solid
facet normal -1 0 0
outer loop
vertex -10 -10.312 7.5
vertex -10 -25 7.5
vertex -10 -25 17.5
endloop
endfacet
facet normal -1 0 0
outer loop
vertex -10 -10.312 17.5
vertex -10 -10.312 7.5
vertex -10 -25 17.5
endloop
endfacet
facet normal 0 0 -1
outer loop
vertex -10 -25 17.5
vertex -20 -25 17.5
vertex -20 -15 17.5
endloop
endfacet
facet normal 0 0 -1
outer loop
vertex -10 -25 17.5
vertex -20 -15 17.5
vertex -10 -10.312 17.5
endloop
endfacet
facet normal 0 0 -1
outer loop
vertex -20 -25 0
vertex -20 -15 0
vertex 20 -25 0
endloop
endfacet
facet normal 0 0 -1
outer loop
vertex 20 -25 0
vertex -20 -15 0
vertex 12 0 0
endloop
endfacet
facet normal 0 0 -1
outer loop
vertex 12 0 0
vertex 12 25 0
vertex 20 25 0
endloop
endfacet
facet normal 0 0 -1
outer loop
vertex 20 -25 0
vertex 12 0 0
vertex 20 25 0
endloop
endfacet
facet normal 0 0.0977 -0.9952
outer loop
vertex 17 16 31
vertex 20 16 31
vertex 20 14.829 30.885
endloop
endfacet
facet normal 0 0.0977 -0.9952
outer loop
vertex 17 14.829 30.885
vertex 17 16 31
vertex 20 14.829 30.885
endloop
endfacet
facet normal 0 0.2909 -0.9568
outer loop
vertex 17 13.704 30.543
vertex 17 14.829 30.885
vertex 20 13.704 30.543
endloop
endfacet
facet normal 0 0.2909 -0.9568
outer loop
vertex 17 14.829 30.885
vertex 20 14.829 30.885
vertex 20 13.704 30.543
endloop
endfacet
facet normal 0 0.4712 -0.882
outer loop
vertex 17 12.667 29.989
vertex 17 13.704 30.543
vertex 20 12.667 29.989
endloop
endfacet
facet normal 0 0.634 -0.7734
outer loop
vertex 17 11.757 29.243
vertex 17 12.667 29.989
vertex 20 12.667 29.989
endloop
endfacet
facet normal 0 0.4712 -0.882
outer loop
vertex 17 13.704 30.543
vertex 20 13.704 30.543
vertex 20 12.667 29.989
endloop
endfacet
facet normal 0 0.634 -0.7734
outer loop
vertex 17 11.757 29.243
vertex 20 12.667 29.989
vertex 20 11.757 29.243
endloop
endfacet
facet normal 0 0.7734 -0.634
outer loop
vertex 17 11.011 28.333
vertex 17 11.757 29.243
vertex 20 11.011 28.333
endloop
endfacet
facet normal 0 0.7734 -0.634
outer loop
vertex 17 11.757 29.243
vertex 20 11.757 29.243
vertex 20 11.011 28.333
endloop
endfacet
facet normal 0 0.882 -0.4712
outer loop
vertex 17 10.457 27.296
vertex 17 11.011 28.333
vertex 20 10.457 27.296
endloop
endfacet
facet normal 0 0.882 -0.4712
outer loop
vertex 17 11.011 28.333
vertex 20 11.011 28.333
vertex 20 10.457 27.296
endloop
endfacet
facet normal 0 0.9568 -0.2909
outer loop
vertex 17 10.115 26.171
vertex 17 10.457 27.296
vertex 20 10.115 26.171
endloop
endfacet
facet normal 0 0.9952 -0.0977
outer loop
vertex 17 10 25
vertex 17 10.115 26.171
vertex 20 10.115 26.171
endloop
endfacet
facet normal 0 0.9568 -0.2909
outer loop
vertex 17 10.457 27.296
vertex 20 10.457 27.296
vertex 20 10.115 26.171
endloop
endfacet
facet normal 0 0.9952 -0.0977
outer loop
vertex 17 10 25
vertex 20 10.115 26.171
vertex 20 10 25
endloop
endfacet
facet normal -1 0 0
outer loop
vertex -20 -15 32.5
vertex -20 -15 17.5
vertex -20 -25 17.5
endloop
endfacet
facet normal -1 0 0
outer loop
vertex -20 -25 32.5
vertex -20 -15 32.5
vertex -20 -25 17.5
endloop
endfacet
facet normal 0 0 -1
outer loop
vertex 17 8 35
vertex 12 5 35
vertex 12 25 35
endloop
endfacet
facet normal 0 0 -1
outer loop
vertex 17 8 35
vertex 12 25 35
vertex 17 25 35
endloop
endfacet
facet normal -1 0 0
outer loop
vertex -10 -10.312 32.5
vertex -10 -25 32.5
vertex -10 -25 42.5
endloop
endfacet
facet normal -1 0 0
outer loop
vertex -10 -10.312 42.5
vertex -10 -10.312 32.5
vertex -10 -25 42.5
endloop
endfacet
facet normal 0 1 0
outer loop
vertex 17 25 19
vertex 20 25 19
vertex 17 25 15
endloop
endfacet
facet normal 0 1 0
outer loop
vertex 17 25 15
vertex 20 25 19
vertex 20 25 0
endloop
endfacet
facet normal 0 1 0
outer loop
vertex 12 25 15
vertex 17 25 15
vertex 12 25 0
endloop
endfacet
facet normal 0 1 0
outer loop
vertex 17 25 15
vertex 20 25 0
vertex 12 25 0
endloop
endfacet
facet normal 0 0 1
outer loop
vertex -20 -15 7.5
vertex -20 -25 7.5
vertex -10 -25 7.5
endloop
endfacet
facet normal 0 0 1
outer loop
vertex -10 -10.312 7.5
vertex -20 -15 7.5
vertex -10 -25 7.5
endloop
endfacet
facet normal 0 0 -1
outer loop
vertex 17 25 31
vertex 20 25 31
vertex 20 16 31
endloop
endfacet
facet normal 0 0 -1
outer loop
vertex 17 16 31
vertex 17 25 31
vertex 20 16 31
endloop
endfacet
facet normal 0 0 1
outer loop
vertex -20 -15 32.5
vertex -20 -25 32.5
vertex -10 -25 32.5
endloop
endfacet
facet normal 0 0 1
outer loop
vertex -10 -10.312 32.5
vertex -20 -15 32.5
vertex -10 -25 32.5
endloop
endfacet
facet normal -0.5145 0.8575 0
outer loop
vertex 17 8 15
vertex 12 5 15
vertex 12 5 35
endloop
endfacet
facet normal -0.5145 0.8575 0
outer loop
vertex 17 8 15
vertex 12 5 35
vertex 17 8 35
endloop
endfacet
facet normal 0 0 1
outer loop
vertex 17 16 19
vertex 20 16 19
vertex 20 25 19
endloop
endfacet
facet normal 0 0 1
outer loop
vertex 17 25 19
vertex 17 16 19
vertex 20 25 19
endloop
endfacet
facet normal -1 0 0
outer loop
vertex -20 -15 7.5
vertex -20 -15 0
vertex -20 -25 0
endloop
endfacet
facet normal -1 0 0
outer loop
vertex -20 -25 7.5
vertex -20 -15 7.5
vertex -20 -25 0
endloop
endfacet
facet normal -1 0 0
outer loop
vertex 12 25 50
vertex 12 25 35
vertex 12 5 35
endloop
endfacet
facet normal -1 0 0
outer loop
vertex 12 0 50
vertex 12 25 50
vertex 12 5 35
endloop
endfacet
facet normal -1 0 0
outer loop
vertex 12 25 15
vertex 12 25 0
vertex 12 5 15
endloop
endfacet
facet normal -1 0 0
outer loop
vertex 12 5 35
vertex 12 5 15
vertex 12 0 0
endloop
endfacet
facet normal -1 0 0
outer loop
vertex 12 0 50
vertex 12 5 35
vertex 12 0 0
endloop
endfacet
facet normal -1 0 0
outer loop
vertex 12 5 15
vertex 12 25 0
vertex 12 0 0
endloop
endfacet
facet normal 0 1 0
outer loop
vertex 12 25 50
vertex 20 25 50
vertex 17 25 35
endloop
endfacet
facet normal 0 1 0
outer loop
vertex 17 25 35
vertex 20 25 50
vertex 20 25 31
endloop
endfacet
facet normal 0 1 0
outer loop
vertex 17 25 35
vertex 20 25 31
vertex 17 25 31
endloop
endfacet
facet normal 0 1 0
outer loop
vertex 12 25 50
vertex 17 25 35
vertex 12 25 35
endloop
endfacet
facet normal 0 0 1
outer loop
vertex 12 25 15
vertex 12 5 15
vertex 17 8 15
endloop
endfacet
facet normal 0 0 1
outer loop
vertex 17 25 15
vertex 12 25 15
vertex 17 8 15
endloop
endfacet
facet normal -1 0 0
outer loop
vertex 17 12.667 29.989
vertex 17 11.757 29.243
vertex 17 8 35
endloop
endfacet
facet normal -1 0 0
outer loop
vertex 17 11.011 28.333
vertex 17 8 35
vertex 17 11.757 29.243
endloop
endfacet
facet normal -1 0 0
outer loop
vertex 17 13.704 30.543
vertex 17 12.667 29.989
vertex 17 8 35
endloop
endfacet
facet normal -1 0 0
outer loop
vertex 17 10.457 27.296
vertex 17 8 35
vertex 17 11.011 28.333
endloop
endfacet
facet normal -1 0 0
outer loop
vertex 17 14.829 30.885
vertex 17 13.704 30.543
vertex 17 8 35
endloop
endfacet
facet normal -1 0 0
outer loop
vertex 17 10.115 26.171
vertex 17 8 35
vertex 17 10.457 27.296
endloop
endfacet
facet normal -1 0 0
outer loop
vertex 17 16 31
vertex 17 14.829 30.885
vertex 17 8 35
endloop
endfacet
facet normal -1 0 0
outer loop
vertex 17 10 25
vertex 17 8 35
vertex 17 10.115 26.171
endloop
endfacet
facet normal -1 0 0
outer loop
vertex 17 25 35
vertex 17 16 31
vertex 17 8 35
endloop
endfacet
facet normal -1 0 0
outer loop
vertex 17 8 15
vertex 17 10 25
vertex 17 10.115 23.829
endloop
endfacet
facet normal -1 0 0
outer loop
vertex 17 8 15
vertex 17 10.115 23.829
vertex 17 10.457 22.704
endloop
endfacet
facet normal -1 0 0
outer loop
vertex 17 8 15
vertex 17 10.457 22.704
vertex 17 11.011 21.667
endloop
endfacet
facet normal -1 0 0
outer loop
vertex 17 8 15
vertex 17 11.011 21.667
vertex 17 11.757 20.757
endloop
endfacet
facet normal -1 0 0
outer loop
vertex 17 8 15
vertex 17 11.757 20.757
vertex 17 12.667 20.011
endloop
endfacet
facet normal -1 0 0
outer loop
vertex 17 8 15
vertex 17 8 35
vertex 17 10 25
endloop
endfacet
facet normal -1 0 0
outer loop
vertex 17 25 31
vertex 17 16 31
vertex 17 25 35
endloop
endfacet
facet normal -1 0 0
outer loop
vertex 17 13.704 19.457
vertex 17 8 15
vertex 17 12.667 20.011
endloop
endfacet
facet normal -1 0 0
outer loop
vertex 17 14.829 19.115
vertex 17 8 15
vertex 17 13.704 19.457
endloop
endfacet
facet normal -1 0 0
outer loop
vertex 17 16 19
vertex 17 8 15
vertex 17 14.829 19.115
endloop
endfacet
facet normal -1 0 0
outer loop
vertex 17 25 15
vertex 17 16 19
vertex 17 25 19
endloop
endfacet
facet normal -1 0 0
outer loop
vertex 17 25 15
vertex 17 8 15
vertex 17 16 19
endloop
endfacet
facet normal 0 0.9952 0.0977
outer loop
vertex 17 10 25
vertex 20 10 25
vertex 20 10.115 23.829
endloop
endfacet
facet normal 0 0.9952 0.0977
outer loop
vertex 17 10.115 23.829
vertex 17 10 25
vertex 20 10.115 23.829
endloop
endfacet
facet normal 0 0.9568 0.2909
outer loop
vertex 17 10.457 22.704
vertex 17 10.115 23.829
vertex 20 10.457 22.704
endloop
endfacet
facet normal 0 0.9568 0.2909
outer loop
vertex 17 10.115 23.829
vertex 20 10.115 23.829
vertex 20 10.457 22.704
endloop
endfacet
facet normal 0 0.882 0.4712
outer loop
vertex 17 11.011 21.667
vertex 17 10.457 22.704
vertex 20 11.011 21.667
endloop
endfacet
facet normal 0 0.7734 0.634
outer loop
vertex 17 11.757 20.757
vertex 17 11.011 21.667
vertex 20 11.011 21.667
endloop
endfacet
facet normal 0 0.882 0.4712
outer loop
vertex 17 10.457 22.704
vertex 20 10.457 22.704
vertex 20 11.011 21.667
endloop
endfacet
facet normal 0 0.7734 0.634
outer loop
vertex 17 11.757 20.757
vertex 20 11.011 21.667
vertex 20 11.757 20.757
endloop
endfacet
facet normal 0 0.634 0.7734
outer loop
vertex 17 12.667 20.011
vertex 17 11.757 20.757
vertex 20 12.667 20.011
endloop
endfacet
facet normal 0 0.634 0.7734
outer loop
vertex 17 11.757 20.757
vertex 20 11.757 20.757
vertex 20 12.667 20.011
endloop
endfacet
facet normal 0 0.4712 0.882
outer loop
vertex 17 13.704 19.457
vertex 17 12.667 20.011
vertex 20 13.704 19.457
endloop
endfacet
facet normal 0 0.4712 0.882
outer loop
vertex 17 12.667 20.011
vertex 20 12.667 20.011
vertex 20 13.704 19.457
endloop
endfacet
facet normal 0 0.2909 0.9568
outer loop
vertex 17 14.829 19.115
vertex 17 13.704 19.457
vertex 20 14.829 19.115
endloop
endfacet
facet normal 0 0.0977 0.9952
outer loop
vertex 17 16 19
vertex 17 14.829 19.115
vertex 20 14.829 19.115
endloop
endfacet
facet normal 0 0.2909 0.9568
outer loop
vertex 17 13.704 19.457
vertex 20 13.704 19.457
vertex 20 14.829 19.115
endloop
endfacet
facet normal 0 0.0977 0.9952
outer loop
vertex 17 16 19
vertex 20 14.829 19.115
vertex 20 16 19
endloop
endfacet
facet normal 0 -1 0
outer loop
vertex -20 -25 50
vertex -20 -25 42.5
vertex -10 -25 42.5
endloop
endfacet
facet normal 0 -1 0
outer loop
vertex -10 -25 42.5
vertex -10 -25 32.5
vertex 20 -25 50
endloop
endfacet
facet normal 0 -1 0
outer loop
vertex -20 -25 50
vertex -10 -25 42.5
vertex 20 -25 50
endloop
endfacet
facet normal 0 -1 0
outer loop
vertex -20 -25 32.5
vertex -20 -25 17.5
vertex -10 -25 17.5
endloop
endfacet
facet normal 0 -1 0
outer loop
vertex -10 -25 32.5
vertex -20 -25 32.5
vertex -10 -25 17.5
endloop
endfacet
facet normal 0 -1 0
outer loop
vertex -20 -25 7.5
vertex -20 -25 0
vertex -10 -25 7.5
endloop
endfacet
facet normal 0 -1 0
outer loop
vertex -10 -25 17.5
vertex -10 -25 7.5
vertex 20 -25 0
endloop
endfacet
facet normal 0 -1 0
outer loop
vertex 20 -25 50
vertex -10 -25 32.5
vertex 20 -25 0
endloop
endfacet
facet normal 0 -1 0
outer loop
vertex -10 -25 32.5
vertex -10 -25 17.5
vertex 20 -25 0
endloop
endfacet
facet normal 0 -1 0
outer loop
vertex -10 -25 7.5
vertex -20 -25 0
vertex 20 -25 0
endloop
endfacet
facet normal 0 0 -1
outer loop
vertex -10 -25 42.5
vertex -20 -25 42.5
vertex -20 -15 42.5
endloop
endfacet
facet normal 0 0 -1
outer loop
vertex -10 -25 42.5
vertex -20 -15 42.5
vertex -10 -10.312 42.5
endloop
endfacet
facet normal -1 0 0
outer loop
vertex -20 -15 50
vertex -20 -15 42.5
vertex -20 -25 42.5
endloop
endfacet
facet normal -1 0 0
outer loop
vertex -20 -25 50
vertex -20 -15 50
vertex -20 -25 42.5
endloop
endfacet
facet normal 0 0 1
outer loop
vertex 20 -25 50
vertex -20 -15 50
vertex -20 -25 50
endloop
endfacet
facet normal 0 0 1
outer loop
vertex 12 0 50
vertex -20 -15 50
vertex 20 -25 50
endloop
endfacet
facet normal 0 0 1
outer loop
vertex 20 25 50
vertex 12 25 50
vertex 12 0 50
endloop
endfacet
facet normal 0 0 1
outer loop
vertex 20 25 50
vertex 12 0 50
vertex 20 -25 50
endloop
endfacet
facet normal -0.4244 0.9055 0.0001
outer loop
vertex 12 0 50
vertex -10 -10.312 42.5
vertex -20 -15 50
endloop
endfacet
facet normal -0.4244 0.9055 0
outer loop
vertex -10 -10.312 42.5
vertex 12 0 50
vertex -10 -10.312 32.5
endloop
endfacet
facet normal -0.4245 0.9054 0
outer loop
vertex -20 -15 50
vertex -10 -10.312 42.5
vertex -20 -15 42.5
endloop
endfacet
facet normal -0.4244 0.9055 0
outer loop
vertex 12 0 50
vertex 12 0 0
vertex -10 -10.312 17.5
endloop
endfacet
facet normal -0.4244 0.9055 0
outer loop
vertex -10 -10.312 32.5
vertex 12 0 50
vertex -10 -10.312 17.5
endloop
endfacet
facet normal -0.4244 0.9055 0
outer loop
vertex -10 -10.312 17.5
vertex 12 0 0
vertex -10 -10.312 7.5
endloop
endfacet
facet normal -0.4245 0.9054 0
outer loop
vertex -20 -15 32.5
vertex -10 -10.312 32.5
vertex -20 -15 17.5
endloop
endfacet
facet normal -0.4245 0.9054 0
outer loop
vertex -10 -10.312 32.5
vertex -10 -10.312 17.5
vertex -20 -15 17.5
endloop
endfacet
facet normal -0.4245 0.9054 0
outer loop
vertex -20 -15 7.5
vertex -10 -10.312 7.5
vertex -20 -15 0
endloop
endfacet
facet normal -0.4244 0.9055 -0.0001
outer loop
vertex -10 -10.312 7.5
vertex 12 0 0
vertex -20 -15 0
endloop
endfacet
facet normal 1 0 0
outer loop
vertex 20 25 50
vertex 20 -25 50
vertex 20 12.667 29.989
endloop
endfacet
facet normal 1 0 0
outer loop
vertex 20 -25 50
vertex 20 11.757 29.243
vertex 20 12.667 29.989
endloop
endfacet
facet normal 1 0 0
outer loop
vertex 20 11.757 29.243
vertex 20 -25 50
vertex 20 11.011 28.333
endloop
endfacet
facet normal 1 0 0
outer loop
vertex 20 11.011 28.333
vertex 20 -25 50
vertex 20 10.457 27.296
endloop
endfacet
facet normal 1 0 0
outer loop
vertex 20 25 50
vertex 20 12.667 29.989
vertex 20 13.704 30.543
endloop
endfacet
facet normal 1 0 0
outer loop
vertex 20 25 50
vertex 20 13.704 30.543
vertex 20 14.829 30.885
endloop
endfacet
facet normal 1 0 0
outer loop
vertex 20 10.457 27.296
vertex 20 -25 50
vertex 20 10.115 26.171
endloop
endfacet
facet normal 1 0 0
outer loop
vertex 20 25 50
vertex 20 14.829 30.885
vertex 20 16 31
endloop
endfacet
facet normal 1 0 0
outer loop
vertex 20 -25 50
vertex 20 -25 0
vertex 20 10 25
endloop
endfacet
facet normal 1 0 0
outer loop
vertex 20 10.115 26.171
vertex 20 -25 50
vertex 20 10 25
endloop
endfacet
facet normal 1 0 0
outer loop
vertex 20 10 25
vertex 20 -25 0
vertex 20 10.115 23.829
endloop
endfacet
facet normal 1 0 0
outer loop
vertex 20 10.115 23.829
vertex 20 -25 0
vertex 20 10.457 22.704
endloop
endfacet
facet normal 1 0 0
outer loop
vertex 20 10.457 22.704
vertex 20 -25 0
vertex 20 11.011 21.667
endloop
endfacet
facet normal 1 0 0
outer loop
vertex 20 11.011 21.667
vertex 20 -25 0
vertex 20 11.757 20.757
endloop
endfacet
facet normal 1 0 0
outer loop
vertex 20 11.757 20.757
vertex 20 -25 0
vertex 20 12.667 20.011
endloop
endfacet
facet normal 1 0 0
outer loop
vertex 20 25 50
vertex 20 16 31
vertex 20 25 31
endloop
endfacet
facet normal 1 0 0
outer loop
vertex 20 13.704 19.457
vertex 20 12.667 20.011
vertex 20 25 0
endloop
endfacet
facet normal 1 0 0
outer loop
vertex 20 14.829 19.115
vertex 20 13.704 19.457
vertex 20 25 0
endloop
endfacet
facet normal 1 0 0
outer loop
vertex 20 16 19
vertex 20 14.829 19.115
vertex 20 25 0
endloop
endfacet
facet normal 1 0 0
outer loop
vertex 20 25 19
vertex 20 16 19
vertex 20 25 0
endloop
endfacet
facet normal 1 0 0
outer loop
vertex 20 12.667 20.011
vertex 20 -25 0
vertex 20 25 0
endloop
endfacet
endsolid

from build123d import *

# Parameters (mm, degrees)
EXTRUDE_1_DEPTH          = 50
SKETCH_2_W               = 10
SKETCH_2_H               = 10
CUT_EXTRUDE_1_DEPTH      = 74.484692283
CUT_EXTRUDE_2_DEPTH      = 50
CUT_EXTRUDE_3_DEPTH      = 10
CUT_EXTRUDE_3_DEPTH_BACK = 10


with BuildPart() as part:
    # Эскиз1 → Бобышка-Вытянуть1 (new body)
    with BuildSketch(Plane.XY):
        Polygon((20, 25), (12, 25), (12, 0), (-20, -15), (-20, -25), (20, -25), align=None)
    extrude(amount=EXTRUDE_1_DEPTH)

    # Эскиз2 → Вырез-Вытянуть1 (cut, through all)
    with BuildSketch(Plane.XZ.offset(25)):
        with Locations((-15, 12.5)):
            Rectangle(SKETCH_2_W, SKETCH_2_H)
        with Locations((-15, 37.5)):
            Rectangle(SKETCH_2_W, SKETCH_2_H)
    extrude(amount=-CUT_EXTRUDE_1_DEPTH, mode=Mode.SUBTRACT)

    # Эскиз3 → Вырез-Вытянуть2 (cut)
    with BuildSketch(Plane(origin=(20, 0, 0), x_dir=(0, 0, -1), z_dir=(1, 0, 0))):
        with BuildLine():
            Line((-19, 25), (-25, 25))
            Line((-25, 25), (-25, 22))
            ThreePointArc((-25, 22), (-20.757359313, 20.242640687), (-19, 16))
            Line((-19, 16), (-19, 25))
        make_face()
        with BuildLine():
            ThreePointArc((-19, 16), (-20.757359313, 20.242640687), (-25, 22))
            Line((-25, 22), (-25, 10))
            ThreePointArc((-25, 10), (-20.757359313, 11.757359313), (-19, 16))
        make_face()
        with BuildLine():
            Line((-25, 10), (-25, 22))
            ThreePointArc((-25, 22), (-29.242640687, 20.242640687), (-31, 16))
            ThreePointArc((-31, 16), (-29.242640687, 11.757359313), (-25, 10))
        make_face()
        with BuildLine():
            Line((-25, 22), (-25, 25))
            Line((-25, 25), (-31, 25))
            Line((-31, 25), (-31, 16))
            ThreePointArc((-31, 16), (-29.242640687, 20.242640687), (-25, 22))
        make_face()
    extrude(amount=-CUT_EXTRUDE_2_DEPTH, mode=Mode.SUBTRACT)

    # Эскиз4 → Вырез-Вытянуть3 (cut, two sides: drawn at the far end of the back side and taken through both)
    with BuildSketch(Plane.XY.offset(25).offset(-CUT_EXTRUDE_3_DEPTH_BACK)):
        Polygon((12, 25), (12, 5), (17, 8), (17, 25), align=None)
    extrude(amount=CUT_EXTRUDE_3_DEPTH + CUT_EXTRUDE_3_DEPTH_BACK, mode=Mode.SUBTRACT)


solid = part.part
